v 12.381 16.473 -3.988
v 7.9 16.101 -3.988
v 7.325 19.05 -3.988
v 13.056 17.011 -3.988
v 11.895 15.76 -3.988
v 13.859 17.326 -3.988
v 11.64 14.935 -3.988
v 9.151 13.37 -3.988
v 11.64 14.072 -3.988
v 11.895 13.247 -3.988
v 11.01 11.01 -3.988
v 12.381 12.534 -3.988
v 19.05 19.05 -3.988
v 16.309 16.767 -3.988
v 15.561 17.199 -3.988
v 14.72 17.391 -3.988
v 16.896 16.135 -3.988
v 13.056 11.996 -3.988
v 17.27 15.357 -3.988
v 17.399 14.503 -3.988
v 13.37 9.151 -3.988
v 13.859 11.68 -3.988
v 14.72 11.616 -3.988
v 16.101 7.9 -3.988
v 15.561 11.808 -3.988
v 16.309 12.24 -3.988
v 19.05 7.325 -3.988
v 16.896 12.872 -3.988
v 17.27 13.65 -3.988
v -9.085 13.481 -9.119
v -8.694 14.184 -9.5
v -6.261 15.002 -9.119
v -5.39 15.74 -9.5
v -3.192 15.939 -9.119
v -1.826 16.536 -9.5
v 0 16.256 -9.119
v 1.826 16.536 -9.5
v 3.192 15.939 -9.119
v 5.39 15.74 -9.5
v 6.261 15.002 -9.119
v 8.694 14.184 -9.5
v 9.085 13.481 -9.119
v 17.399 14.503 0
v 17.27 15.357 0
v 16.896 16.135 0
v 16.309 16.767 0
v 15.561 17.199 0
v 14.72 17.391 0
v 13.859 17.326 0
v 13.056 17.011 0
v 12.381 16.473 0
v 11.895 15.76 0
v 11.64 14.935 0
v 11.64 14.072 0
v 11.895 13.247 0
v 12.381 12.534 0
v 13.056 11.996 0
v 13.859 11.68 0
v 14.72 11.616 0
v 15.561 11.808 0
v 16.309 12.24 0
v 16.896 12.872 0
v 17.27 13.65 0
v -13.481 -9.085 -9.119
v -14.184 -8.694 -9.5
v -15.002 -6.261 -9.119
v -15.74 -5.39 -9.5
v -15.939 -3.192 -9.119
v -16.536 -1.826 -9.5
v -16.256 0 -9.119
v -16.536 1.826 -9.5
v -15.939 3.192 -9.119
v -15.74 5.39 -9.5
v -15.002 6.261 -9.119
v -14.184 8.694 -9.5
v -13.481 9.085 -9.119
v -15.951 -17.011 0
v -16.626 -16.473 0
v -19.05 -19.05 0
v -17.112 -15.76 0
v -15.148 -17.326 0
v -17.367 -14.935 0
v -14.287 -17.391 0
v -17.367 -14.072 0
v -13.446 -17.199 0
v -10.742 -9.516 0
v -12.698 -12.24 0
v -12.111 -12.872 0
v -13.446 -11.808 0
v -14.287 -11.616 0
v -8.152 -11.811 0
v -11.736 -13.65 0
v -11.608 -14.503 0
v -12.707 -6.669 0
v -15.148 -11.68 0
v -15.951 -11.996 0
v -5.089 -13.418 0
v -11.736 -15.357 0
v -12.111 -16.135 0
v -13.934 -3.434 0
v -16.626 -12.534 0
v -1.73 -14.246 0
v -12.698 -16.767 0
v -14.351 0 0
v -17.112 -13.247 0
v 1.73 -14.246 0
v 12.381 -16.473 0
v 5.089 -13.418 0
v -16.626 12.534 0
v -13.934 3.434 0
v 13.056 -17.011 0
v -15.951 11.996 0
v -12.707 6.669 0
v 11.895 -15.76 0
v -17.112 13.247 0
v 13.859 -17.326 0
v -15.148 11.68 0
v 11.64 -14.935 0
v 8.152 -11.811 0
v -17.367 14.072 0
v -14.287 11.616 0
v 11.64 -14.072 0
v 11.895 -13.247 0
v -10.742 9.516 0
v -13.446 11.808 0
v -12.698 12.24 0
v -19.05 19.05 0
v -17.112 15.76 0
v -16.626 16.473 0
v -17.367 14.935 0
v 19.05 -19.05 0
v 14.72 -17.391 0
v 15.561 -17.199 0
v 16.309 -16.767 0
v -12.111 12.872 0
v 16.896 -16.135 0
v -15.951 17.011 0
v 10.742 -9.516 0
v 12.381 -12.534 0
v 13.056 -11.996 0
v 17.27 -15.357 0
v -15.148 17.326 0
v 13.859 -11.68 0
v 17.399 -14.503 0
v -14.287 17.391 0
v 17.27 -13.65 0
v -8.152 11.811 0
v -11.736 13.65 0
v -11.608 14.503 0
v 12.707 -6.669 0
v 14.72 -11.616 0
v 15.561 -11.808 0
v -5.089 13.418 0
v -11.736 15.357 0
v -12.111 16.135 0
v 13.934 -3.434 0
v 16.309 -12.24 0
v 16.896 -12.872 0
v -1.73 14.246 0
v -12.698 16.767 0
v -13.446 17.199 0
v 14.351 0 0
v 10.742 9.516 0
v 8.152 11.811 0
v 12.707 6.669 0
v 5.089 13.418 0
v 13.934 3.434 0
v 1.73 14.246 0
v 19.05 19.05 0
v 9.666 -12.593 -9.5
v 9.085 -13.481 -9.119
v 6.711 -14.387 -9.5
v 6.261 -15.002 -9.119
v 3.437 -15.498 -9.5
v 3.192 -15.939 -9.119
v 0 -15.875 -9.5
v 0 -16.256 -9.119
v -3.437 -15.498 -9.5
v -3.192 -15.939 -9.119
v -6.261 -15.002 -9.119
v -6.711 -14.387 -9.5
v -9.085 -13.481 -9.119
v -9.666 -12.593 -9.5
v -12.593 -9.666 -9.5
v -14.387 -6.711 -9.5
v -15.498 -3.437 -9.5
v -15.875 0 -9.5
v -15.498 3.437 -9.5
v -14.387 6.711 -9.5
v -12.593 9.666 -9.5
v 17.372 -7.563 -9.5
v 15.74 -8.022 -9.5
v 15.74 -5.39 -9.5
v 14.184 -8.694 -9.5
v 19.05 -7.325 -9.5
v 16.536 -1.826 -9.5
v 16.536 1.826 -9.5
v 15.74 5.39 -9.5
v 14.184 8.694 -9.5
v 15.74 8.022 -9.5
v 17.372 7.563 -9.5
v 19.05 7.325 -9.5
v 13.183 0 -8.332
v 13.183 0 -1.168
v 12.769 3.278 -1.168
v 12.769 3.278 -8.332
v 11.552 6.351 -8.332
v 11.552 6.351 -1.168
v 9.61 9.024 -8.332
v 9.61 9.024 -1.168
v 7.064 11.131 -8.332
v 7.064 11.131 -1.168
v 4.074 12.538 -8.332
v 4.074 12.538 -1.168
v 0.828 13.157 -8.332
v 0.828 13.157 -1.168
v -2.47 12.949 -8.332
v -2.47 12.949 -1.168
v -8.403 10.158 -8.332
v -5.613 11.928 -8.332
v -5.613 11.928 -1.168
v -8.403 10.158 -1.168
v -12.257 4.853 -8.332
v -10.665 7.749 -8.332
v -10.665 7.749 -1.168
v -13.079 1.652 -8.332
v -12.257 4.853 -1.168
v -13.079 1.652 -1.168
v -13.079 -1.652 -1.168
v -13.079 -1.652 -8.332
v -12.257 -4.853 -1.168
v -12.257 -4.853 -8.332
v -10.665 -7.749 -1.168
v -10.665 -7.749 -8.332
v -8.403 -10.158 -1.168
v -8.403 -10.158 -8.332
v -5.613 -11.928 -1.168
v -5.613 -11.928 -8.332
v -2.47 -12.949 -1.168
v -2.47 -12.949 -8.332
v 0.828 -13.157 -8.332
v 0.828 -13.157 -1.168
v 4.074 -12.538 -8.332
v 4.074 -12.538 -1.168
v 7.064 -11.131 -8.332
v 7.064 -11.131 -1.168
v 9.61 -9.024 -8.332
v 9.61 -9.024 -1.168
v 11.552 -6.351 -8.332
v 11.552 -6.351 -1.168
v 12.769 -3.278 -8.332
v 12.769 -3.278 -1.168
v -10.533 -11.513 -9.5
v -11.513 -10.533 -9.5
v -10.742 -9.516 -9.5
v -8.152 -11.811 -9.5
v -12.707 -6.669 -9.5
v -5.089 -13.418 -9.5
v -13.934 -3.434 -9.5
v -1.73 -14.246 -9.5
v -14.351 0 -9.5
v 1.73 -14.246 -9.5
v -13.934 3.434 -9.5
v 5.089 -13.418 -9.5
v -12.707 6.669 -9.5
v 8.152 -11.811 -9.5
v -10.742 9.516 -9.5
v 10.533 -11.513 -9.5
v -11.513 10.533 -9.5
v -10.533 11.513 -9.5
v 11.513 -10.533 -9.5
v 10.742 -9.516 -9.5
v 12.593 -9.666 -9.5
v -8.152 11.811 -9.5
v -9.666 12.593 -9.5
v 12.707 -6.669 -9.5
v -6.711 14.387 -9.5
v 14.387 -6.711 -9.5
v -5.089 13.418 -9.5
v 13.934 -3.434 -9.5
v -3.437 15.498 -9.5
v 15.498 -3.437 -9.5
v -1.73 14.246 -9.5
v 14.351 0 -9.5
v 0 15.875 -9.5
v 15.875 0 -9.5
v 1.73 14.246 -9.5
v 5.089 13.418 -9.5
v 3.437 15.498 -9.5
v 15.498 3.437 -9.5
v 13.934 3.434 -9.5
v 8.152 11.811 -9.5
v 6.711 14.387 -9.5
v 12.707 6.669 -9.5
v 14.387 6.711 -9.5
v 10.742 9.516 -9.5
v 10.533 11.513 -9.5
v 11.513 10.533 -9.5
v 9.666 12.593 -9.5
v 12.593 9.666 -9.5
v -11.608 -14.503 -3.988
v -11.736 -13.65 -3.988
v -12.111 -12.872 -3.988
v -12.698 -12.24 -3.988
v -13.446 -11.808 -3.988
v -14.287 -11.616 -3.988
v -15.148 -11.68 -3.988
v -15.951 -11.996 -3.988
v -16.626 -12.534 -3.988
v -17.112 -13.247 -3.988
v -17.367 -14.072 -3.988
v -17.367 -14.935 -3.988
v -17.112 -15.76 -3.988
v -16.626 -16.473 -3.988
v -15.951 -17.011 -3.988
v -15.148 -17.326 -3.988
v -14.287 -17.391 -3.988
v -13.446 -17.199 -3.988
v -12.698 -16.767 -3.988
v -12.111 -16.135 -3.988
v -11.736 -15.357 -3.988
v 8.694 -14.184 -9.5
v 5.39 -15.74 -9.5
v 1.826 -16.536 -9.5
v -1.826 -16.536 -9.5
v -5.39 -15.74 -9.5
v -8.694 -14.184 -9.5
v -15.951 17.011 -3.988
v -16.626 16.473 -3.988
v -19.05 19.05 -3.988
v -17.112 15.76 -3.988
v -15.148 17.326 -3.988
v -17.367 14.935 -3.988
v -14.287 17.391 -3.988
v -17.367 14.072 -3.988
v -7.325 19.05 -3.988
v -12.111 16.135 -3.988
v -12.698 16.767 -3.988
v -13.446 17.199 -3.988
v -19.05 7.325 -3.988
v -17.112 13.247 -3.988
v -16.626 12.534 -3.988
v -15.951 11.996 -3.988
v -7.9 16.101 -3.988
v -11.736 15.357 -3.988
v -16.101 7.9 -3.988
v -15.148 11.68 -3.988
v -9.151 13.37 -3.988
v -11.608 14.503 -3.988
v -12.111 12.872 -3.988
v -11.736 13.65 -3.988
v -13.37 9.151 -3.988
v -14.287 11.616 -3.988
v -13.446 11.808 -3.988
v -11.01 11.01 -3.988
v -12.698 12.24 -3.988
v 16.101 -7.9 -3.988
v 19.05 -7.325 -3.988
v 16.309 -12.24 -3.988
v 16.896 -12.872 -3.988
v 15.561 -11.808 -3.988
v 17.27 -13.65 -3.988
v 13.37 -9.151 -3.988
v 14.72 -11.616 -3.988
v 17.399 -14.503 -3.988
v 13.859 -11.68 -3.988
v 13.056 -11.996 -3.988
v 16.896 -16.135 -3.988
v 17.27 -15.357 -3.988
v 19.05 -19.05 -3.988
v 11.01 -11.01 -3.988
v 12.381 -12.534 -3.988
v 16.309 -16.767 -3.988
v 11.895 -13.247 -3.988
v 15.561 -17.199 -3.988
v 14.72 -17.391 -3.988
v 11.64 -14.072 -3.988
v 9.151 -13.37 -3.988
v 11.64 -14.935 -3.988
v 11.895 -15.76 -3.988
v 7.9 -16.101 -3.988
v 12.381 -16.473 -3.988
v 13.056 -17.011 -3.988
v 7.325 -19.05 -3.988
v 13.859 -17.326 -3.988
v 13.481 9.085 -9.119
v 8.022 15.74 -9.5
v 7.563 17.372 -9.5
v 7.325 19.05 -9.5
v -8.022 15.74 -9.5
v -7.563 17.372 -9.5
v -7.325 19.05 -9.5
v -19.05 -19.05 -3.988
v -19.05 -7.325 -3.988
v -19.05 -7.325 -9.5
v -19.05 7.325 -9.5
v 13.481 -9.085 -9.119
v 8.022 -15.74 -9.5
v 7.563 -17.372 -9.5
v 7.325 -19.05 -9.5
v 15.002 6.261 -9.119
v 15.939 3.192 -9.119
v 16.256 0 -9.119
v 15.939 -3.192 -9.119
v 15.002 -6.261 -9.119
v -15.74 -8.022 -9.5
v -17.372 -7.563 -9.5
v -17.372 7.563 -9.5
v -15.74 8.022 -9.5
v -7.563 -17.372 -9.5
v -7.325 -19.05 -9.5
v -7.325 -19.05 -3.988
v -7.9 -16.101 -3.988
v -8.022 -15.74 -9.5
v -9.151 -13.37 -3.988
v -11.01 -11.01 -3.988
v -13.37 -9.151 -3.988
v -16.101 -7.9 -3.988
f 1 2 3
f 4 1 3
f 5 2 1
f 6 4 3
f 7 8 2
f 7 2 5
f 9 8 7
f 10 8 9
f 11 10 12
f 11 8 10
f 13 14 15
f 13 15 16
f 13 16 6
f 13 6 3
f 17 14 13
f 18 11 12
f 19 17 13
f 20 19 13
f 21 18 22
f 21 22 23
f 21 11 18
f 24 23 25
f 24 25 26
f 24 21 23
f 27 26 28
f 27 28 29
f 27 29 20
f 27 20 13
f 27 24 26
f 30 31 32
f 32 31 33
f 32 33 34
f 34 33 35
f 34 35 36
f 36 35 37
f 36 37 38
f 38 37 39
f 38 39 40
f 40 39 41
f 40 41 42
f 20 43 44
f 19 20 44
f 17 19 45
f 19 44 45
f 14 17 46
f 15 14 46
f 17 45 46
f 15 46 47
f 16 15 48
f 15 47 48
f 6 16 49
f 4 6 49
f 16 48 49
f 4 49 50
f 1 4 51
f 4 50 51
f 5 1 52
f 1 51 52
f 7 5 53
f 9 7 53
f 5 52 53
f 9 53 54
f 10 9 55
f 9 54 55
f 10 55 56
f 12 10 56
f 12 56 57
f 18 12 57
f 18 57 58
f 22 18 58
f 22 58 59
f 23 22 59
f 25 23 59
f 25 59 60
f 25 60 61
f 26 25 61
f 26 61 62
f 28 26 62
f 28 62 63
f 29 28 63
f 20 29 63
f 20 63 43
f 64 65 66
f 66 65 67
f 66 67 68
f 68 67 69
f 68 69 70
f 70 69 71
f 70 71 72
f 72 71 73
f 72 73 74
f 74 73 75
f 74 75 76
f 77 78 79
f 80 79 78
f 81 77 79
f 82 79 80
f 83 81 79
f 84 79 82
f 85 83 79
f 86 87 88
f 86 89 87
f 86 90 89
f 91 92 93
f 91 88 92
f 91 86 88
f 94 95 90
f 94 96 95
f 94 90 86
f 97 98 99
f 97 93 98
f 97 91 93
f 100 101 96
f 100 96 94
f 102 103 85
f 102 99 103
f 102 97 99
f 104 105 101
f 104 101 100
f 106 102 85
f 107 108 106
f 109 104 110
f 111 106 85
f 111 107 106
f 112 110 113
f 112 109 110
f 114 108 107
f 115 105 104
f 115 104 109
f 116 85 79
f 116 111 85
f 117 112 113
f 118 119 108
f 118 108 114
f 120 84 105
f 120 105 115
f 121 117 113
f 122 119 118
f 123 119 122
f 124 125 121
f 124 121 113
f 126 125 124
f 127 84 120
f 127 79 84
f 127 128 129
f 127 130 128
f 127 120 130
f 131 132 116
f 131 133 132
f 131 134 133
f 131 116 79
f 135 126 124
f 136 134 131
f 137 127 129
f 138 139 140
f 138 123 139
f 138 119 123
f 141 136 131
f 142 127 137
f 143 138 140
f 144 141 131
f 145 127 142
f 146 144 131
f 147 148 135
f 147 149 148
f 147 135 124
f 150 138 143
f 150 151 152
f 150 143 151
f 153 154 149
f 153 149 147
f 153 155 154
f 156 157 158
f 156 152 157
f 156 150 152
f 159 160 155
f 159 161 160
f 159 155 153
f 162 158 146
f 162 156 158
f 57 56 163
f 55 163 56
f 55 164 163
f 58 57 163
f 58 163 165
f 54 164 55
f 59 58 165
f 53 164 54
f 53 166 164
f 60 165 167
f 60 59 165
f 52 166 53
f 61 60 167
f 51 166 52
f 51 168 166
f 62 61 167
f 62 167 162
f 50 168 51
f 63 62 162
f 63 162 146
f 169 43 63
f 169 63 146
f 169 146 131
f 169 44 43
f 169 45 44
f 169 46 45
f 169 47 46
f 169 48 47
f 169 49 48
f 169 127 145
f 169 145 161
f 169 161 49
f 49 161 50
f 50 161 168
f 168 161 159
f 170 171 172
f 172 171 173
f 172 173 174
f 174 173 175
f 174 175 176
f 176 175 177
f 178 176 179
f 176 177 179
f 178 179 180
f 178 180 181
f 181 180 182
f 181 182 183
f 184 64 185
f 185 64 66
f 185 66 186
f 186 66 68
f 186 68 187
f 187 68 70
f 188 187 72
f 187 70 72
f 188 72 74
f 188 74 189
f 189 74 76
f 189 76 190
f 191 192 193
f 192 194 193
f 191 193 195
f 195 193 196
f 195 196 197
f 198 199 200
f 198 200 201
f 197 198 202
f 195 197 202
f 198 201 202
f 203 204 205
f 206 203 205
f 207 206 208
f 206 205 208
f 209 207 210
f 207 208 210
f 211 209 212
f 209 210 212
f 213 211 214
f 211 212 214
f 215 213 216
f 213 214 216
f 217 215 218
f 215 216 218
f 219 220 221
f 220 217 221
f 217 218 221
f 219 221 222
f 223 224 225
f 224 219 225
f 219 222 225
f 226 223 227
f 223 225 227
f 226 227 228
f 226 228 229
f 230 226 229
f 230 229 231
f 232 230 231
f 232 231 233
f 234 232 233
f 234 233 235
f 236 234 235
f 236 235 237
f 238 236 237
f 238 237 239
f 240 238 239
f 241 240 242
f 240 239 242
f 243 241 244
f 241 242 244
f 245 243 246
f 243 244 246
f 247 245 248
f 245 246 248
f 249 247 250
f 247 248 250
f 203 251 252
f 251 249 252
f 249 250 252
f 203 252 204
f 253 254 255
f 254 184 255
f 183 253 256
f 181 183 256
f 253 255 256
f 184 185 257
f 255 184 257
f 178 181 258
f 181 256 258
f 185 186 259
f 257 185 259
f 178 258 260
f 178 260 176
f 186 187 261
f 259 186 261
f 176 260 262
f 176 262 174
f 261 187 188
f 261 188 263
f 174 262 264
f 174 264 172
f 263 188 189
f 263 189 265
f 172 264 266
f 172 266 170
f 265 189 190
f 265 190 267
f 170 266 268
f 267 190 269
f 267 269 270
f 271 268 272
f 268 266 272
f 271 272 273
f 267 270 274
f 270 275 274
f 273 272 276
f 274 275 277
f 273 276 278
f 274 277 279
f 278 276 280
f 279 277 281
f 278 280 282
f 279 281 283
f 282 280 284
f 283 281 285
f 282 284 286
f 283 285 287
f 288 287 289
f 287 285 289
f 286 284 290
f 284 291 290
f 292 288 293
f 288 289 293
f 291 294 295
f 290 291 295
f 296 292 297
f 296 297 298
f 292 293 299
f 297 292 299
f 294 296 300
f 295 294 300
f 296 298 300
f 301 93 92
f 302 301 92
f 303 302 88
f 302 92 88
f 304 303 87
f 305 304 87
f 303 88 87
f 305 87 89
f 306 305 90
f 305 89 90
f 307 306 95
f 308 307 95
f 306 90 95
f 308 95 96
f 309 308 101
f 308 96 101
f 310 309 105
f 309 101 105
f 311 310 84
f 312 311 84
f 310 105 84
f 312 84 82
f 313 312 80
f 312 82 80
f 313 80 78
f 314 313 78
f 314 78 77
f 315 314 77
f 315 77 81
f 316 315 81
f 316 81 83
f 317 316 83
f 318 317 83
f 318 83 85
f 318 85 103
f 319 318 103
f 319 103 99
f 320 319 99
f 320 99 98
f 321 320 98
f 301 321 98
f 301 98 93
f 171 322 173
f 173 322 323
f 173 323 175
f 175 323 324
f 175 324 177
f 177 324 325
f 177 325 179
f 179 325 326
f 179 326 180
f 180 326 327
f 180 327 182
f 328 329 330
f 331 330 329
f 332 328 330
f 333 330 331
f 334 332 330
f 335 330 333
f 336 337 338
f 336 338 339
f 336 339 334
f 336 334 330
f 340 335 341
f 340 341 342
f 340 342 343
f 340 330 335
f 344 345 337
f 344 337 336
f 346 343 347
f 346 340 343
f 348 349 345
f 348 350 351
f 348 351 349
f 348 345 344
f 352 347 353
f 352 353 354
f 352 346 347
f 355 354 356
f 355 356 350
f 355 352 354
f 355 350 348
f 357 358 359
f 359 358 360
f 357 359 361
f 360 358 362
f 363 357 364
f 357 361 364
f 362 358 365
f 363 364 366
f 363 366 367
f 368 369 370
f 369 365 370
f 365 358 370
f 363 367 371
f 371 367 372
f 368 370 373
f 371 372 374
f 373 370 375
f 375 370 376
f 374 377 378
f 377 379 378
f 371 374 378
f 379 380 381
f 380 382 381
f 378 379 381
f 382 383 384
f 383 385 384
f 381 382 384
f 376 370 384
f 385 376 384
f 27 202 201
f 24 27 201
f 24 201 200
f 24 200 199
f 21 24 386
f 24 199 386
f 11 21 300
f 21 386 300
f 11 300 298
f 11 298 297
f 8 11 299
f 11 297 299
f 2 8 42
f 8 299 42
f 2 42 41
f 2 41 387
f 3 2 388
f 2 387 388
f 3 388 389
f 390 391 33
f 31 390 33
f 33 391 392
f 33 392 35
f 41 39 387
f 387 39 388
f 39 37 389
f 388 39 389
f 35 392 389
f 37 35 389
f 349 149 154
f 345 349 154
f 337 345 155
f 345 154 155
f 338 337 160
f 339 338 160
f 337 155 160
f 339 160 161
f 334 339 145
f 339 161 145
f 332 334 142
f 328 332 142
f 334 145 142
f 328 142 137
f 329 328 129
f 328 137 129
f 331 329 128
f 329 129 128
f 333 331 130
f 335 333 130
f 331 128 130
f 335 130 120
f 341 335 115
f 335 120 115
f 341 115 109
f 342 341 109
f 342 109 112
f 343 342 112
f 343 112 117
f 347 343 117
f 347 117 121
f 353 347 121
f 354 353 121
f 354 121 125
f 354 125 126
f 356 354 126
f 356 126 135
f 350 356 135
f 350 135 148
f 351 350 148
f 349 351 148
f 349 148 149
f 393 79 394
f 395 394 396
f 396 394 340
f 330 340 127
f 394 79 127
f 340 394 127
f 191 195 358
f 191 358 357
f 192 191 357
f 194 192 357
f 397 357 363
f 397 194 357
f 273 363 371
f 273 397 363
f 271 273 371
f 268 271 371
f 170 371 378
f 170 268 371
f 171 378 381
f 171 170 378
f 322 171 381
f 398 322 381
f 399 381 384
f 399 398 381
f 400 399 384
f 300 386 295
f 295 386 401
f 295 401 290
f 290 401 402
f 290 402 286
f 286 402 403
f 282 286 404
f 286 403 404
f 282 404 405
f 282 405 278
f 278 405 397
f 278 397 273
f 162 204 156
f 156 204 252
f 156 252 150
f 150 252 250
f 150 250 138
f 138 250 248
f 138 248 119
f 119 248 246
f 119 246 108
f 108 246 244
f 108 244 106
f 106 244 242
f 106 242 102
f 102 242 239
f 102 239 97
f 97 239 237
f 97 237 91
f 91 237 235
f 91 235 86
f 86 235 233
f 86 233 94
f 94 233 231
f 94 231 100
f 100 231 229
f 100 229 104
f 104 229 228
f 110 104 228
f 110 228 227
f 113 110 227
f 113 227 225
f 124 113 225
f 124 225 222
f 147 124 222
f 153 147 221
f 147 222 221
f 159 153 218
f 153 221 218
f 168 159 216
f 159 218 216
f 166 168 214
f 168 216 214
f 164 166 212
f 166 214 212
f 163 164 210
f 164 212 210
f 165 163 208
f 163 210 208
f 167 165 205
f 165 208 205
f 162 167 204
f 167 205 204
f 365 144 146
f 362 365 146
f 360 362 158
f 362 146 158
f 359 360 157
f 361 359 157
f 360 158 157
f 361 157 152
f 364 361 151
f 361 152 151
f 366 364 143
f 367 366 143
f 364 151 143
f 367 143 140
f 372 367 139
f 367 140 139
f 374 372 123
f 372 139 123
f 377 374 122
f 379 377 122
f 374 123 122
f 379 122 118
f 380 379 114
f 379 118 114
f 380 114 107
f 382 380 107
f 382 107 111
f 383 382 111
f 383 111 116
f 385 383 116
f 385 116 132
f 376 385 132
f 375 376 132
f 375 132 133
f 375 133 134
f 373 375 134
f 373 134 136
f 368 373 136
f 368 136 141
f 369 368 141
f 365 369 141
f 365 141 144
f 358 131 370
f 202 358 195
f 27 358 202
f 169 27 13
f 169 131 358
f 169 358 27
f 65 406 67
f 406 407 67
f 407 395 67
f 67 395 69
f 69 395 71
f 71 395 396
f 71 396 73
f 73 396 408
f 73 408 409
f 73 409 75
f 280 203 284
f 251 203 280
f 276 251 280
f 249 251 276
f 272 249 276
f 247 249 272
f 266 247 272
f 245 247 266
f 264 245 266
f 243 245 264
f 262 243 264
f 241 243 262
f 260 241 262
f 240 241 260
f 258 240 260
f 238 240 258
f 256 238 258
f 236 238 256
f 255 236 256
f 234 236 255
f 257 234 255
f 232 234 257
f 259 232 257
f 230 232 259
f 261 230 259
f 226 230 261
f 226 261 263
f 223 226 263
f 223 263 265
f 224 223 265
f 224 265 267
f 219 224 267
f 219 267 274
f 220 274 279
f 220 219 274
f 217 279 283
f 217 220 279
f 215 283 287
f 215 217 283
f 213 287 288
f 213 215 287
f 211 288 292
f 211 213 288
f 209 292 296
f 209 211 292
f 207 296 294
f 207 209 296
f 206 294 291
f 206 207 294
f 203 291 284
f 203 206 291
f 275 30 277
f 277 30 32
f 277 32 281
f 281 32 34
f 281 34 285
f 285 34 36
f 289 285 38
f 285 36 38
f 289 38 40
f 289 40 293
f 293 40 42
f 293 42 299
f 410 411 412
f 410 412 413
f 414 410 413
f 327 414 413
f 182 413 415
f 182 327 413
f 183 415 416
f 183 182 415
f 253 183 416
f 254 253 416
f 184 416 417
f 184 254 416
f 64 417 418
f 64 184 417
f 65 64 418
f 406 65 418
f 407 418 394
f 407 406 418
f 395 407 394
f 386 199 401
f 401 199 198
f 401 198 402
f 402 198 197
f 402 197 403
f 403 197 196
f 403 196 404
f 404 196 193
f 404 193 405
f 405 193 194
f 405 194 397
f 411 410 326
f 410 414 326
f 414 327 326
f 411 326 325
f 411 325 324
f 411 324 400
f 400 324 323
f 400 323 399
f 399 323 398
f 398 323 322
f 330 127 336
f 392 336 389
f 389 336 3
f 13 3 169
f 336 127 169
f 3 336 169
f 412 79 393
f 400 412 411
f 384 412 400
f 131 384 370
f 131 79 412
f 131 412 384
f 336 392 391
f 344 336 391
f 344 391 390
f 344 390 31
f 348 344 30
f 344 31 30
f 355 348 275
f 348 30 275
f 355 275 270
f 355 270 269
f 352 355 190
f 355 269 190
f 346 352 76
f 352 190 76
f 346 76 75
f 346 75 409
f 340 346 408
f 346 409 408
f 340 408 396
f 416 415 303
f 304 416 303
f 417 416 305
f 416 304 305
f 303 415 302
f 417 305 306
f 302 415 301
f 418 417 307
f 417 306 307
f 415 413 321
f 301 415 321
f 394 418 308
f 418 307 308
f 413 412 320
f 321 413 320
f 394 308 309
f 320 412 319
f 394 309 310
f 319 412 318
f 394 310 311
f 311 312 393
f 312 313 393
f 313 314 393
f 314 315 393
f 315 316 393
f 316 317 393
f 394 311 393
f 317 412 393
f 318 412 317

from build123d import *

# Parameters (mm, degrees)
SKETCH1_W          = 38.1
SKETCH1_H          = 38.1
SKETCH1_R          = 13.183
EXTRUDE1_DEPTH     = 9.4996
CUT_EXTRUDE1_DEPTH = 5.5118
HOLE1_D            = 5.7912
HOLE1_DEPTH        = 3.9878


with BuildPart() as part:
    # Sketch1 → Extrude1 (new body)
    with BuildSketch(Plane.XY):
        Rectangle(SKETCH1_W, SKETCH1_H)
        Circle(SKETCH1_R, mode=Mode.SUBTRACT)
    extrude(amount=-EXTRUDE1_DEPTH)

    # Sketch2 → Cut-Extrude1 (cut)
    with BuildSketch(Plane(origin=(0, 0, -9.4996), x_dir=(1, 0, 0), z_dir=(0, 0, -1))):
        with BuildLine():
            Line((19.05, 19.05), (19.05, 7.324620334))
            ThreePointArc((19.05, 7.324620334), (11.009543879, 11.009543879), (7.324620334, 19.05))
            Line((7.324620334, 19.05), (19.05, 19.05))
        make_face()
        with BuildLine():
            Line((19.05, -19.05), (19.05, -7.324620334))
            ThreePointArc((19.05, -7.324620334), (11.009543879, -11.009543879), (7.324620334, -19.05))
            Line((7.324620334, -19.05), (19.05, -19.05))
        make_face()
        with BuildLine():
            Line((-19.05, -19.05), (-7.324620334, -19.05))
            ThreePointArc((-7.324620334, -19.05), (-11.009543879, -11.009543879), (-19.05, -7.324620334))
            Line((-19.05, -7.324620334), (-19.05, -19.05))
        make_face()
        with BuildLine():
            Line((-19.05, 19.05), (-7.324620334, 19.05))
            ThreePointArc((-7.324620334, 19.05), (-11.009543879, 11.009543879), (-19.05, 7.324620334))
            Line((-19.05, 7.324620334), (-19.05, 19.05))
        make_face()
    extrude(amount=-CUT_EXTRUDE1_DEPTH, mode=Mode.SUBTRACT)

    # Hole1
    with Locations(Plane(origin=(0, 0, -3.9878), x_dir=(-1, 0, 0), z_dir=(0, 0, -1))):
        with Locations((14.5034, 14.5034), (14.5034, -14.5034), (-14.5034, 14.5034), (-14.5034, -14.5034)):
            Hole(HOLE1_D / 2, depth=HOLE1_DEPTH)

    # Sketch5 → Cut-Revolve1 (revolve, cut)
    with BuildSketch(Plane(origin=(0, 0, 0), x_dir=(0, 0, -1), z_dir=(1, 0, 0)), mode=Mode.PRIVATE) as cut_revolve1_sk:
        Polygon((9.4996, 13.183), (9.4996, 14.351), (8.3316, 13.183), align=None)
        Polygon((1.168, 13.183), (0, 13.183), (0, 14.351), align=None)
    revolve(cut_revolve1_sk.sketch.rotate(Axis((0, 0, 7.380919067), (0, 0, -1)), 90), axis=Axis((0, 0, 7.380919067), (0, 0, -1)), mode=Mode.SUBTRACT)  # turned: the seam where the file's is

    # Sketch6 → Cut-Revolve2 (revolve, cut)
    with BuildSketch(Plane(origin=(0, 0, 0), x_dir=(1, 0, 0), z_dir=(0, 1, 0))):
        Polygon((15.875, 9.4996), (16.256, 9.1186), (16.637, 9.4996), align=None)
    revolve(axis=Axis((0, 0, 0), (0, 0, -1)), mode=Mode.SUBTRACT)


solid = part.part
